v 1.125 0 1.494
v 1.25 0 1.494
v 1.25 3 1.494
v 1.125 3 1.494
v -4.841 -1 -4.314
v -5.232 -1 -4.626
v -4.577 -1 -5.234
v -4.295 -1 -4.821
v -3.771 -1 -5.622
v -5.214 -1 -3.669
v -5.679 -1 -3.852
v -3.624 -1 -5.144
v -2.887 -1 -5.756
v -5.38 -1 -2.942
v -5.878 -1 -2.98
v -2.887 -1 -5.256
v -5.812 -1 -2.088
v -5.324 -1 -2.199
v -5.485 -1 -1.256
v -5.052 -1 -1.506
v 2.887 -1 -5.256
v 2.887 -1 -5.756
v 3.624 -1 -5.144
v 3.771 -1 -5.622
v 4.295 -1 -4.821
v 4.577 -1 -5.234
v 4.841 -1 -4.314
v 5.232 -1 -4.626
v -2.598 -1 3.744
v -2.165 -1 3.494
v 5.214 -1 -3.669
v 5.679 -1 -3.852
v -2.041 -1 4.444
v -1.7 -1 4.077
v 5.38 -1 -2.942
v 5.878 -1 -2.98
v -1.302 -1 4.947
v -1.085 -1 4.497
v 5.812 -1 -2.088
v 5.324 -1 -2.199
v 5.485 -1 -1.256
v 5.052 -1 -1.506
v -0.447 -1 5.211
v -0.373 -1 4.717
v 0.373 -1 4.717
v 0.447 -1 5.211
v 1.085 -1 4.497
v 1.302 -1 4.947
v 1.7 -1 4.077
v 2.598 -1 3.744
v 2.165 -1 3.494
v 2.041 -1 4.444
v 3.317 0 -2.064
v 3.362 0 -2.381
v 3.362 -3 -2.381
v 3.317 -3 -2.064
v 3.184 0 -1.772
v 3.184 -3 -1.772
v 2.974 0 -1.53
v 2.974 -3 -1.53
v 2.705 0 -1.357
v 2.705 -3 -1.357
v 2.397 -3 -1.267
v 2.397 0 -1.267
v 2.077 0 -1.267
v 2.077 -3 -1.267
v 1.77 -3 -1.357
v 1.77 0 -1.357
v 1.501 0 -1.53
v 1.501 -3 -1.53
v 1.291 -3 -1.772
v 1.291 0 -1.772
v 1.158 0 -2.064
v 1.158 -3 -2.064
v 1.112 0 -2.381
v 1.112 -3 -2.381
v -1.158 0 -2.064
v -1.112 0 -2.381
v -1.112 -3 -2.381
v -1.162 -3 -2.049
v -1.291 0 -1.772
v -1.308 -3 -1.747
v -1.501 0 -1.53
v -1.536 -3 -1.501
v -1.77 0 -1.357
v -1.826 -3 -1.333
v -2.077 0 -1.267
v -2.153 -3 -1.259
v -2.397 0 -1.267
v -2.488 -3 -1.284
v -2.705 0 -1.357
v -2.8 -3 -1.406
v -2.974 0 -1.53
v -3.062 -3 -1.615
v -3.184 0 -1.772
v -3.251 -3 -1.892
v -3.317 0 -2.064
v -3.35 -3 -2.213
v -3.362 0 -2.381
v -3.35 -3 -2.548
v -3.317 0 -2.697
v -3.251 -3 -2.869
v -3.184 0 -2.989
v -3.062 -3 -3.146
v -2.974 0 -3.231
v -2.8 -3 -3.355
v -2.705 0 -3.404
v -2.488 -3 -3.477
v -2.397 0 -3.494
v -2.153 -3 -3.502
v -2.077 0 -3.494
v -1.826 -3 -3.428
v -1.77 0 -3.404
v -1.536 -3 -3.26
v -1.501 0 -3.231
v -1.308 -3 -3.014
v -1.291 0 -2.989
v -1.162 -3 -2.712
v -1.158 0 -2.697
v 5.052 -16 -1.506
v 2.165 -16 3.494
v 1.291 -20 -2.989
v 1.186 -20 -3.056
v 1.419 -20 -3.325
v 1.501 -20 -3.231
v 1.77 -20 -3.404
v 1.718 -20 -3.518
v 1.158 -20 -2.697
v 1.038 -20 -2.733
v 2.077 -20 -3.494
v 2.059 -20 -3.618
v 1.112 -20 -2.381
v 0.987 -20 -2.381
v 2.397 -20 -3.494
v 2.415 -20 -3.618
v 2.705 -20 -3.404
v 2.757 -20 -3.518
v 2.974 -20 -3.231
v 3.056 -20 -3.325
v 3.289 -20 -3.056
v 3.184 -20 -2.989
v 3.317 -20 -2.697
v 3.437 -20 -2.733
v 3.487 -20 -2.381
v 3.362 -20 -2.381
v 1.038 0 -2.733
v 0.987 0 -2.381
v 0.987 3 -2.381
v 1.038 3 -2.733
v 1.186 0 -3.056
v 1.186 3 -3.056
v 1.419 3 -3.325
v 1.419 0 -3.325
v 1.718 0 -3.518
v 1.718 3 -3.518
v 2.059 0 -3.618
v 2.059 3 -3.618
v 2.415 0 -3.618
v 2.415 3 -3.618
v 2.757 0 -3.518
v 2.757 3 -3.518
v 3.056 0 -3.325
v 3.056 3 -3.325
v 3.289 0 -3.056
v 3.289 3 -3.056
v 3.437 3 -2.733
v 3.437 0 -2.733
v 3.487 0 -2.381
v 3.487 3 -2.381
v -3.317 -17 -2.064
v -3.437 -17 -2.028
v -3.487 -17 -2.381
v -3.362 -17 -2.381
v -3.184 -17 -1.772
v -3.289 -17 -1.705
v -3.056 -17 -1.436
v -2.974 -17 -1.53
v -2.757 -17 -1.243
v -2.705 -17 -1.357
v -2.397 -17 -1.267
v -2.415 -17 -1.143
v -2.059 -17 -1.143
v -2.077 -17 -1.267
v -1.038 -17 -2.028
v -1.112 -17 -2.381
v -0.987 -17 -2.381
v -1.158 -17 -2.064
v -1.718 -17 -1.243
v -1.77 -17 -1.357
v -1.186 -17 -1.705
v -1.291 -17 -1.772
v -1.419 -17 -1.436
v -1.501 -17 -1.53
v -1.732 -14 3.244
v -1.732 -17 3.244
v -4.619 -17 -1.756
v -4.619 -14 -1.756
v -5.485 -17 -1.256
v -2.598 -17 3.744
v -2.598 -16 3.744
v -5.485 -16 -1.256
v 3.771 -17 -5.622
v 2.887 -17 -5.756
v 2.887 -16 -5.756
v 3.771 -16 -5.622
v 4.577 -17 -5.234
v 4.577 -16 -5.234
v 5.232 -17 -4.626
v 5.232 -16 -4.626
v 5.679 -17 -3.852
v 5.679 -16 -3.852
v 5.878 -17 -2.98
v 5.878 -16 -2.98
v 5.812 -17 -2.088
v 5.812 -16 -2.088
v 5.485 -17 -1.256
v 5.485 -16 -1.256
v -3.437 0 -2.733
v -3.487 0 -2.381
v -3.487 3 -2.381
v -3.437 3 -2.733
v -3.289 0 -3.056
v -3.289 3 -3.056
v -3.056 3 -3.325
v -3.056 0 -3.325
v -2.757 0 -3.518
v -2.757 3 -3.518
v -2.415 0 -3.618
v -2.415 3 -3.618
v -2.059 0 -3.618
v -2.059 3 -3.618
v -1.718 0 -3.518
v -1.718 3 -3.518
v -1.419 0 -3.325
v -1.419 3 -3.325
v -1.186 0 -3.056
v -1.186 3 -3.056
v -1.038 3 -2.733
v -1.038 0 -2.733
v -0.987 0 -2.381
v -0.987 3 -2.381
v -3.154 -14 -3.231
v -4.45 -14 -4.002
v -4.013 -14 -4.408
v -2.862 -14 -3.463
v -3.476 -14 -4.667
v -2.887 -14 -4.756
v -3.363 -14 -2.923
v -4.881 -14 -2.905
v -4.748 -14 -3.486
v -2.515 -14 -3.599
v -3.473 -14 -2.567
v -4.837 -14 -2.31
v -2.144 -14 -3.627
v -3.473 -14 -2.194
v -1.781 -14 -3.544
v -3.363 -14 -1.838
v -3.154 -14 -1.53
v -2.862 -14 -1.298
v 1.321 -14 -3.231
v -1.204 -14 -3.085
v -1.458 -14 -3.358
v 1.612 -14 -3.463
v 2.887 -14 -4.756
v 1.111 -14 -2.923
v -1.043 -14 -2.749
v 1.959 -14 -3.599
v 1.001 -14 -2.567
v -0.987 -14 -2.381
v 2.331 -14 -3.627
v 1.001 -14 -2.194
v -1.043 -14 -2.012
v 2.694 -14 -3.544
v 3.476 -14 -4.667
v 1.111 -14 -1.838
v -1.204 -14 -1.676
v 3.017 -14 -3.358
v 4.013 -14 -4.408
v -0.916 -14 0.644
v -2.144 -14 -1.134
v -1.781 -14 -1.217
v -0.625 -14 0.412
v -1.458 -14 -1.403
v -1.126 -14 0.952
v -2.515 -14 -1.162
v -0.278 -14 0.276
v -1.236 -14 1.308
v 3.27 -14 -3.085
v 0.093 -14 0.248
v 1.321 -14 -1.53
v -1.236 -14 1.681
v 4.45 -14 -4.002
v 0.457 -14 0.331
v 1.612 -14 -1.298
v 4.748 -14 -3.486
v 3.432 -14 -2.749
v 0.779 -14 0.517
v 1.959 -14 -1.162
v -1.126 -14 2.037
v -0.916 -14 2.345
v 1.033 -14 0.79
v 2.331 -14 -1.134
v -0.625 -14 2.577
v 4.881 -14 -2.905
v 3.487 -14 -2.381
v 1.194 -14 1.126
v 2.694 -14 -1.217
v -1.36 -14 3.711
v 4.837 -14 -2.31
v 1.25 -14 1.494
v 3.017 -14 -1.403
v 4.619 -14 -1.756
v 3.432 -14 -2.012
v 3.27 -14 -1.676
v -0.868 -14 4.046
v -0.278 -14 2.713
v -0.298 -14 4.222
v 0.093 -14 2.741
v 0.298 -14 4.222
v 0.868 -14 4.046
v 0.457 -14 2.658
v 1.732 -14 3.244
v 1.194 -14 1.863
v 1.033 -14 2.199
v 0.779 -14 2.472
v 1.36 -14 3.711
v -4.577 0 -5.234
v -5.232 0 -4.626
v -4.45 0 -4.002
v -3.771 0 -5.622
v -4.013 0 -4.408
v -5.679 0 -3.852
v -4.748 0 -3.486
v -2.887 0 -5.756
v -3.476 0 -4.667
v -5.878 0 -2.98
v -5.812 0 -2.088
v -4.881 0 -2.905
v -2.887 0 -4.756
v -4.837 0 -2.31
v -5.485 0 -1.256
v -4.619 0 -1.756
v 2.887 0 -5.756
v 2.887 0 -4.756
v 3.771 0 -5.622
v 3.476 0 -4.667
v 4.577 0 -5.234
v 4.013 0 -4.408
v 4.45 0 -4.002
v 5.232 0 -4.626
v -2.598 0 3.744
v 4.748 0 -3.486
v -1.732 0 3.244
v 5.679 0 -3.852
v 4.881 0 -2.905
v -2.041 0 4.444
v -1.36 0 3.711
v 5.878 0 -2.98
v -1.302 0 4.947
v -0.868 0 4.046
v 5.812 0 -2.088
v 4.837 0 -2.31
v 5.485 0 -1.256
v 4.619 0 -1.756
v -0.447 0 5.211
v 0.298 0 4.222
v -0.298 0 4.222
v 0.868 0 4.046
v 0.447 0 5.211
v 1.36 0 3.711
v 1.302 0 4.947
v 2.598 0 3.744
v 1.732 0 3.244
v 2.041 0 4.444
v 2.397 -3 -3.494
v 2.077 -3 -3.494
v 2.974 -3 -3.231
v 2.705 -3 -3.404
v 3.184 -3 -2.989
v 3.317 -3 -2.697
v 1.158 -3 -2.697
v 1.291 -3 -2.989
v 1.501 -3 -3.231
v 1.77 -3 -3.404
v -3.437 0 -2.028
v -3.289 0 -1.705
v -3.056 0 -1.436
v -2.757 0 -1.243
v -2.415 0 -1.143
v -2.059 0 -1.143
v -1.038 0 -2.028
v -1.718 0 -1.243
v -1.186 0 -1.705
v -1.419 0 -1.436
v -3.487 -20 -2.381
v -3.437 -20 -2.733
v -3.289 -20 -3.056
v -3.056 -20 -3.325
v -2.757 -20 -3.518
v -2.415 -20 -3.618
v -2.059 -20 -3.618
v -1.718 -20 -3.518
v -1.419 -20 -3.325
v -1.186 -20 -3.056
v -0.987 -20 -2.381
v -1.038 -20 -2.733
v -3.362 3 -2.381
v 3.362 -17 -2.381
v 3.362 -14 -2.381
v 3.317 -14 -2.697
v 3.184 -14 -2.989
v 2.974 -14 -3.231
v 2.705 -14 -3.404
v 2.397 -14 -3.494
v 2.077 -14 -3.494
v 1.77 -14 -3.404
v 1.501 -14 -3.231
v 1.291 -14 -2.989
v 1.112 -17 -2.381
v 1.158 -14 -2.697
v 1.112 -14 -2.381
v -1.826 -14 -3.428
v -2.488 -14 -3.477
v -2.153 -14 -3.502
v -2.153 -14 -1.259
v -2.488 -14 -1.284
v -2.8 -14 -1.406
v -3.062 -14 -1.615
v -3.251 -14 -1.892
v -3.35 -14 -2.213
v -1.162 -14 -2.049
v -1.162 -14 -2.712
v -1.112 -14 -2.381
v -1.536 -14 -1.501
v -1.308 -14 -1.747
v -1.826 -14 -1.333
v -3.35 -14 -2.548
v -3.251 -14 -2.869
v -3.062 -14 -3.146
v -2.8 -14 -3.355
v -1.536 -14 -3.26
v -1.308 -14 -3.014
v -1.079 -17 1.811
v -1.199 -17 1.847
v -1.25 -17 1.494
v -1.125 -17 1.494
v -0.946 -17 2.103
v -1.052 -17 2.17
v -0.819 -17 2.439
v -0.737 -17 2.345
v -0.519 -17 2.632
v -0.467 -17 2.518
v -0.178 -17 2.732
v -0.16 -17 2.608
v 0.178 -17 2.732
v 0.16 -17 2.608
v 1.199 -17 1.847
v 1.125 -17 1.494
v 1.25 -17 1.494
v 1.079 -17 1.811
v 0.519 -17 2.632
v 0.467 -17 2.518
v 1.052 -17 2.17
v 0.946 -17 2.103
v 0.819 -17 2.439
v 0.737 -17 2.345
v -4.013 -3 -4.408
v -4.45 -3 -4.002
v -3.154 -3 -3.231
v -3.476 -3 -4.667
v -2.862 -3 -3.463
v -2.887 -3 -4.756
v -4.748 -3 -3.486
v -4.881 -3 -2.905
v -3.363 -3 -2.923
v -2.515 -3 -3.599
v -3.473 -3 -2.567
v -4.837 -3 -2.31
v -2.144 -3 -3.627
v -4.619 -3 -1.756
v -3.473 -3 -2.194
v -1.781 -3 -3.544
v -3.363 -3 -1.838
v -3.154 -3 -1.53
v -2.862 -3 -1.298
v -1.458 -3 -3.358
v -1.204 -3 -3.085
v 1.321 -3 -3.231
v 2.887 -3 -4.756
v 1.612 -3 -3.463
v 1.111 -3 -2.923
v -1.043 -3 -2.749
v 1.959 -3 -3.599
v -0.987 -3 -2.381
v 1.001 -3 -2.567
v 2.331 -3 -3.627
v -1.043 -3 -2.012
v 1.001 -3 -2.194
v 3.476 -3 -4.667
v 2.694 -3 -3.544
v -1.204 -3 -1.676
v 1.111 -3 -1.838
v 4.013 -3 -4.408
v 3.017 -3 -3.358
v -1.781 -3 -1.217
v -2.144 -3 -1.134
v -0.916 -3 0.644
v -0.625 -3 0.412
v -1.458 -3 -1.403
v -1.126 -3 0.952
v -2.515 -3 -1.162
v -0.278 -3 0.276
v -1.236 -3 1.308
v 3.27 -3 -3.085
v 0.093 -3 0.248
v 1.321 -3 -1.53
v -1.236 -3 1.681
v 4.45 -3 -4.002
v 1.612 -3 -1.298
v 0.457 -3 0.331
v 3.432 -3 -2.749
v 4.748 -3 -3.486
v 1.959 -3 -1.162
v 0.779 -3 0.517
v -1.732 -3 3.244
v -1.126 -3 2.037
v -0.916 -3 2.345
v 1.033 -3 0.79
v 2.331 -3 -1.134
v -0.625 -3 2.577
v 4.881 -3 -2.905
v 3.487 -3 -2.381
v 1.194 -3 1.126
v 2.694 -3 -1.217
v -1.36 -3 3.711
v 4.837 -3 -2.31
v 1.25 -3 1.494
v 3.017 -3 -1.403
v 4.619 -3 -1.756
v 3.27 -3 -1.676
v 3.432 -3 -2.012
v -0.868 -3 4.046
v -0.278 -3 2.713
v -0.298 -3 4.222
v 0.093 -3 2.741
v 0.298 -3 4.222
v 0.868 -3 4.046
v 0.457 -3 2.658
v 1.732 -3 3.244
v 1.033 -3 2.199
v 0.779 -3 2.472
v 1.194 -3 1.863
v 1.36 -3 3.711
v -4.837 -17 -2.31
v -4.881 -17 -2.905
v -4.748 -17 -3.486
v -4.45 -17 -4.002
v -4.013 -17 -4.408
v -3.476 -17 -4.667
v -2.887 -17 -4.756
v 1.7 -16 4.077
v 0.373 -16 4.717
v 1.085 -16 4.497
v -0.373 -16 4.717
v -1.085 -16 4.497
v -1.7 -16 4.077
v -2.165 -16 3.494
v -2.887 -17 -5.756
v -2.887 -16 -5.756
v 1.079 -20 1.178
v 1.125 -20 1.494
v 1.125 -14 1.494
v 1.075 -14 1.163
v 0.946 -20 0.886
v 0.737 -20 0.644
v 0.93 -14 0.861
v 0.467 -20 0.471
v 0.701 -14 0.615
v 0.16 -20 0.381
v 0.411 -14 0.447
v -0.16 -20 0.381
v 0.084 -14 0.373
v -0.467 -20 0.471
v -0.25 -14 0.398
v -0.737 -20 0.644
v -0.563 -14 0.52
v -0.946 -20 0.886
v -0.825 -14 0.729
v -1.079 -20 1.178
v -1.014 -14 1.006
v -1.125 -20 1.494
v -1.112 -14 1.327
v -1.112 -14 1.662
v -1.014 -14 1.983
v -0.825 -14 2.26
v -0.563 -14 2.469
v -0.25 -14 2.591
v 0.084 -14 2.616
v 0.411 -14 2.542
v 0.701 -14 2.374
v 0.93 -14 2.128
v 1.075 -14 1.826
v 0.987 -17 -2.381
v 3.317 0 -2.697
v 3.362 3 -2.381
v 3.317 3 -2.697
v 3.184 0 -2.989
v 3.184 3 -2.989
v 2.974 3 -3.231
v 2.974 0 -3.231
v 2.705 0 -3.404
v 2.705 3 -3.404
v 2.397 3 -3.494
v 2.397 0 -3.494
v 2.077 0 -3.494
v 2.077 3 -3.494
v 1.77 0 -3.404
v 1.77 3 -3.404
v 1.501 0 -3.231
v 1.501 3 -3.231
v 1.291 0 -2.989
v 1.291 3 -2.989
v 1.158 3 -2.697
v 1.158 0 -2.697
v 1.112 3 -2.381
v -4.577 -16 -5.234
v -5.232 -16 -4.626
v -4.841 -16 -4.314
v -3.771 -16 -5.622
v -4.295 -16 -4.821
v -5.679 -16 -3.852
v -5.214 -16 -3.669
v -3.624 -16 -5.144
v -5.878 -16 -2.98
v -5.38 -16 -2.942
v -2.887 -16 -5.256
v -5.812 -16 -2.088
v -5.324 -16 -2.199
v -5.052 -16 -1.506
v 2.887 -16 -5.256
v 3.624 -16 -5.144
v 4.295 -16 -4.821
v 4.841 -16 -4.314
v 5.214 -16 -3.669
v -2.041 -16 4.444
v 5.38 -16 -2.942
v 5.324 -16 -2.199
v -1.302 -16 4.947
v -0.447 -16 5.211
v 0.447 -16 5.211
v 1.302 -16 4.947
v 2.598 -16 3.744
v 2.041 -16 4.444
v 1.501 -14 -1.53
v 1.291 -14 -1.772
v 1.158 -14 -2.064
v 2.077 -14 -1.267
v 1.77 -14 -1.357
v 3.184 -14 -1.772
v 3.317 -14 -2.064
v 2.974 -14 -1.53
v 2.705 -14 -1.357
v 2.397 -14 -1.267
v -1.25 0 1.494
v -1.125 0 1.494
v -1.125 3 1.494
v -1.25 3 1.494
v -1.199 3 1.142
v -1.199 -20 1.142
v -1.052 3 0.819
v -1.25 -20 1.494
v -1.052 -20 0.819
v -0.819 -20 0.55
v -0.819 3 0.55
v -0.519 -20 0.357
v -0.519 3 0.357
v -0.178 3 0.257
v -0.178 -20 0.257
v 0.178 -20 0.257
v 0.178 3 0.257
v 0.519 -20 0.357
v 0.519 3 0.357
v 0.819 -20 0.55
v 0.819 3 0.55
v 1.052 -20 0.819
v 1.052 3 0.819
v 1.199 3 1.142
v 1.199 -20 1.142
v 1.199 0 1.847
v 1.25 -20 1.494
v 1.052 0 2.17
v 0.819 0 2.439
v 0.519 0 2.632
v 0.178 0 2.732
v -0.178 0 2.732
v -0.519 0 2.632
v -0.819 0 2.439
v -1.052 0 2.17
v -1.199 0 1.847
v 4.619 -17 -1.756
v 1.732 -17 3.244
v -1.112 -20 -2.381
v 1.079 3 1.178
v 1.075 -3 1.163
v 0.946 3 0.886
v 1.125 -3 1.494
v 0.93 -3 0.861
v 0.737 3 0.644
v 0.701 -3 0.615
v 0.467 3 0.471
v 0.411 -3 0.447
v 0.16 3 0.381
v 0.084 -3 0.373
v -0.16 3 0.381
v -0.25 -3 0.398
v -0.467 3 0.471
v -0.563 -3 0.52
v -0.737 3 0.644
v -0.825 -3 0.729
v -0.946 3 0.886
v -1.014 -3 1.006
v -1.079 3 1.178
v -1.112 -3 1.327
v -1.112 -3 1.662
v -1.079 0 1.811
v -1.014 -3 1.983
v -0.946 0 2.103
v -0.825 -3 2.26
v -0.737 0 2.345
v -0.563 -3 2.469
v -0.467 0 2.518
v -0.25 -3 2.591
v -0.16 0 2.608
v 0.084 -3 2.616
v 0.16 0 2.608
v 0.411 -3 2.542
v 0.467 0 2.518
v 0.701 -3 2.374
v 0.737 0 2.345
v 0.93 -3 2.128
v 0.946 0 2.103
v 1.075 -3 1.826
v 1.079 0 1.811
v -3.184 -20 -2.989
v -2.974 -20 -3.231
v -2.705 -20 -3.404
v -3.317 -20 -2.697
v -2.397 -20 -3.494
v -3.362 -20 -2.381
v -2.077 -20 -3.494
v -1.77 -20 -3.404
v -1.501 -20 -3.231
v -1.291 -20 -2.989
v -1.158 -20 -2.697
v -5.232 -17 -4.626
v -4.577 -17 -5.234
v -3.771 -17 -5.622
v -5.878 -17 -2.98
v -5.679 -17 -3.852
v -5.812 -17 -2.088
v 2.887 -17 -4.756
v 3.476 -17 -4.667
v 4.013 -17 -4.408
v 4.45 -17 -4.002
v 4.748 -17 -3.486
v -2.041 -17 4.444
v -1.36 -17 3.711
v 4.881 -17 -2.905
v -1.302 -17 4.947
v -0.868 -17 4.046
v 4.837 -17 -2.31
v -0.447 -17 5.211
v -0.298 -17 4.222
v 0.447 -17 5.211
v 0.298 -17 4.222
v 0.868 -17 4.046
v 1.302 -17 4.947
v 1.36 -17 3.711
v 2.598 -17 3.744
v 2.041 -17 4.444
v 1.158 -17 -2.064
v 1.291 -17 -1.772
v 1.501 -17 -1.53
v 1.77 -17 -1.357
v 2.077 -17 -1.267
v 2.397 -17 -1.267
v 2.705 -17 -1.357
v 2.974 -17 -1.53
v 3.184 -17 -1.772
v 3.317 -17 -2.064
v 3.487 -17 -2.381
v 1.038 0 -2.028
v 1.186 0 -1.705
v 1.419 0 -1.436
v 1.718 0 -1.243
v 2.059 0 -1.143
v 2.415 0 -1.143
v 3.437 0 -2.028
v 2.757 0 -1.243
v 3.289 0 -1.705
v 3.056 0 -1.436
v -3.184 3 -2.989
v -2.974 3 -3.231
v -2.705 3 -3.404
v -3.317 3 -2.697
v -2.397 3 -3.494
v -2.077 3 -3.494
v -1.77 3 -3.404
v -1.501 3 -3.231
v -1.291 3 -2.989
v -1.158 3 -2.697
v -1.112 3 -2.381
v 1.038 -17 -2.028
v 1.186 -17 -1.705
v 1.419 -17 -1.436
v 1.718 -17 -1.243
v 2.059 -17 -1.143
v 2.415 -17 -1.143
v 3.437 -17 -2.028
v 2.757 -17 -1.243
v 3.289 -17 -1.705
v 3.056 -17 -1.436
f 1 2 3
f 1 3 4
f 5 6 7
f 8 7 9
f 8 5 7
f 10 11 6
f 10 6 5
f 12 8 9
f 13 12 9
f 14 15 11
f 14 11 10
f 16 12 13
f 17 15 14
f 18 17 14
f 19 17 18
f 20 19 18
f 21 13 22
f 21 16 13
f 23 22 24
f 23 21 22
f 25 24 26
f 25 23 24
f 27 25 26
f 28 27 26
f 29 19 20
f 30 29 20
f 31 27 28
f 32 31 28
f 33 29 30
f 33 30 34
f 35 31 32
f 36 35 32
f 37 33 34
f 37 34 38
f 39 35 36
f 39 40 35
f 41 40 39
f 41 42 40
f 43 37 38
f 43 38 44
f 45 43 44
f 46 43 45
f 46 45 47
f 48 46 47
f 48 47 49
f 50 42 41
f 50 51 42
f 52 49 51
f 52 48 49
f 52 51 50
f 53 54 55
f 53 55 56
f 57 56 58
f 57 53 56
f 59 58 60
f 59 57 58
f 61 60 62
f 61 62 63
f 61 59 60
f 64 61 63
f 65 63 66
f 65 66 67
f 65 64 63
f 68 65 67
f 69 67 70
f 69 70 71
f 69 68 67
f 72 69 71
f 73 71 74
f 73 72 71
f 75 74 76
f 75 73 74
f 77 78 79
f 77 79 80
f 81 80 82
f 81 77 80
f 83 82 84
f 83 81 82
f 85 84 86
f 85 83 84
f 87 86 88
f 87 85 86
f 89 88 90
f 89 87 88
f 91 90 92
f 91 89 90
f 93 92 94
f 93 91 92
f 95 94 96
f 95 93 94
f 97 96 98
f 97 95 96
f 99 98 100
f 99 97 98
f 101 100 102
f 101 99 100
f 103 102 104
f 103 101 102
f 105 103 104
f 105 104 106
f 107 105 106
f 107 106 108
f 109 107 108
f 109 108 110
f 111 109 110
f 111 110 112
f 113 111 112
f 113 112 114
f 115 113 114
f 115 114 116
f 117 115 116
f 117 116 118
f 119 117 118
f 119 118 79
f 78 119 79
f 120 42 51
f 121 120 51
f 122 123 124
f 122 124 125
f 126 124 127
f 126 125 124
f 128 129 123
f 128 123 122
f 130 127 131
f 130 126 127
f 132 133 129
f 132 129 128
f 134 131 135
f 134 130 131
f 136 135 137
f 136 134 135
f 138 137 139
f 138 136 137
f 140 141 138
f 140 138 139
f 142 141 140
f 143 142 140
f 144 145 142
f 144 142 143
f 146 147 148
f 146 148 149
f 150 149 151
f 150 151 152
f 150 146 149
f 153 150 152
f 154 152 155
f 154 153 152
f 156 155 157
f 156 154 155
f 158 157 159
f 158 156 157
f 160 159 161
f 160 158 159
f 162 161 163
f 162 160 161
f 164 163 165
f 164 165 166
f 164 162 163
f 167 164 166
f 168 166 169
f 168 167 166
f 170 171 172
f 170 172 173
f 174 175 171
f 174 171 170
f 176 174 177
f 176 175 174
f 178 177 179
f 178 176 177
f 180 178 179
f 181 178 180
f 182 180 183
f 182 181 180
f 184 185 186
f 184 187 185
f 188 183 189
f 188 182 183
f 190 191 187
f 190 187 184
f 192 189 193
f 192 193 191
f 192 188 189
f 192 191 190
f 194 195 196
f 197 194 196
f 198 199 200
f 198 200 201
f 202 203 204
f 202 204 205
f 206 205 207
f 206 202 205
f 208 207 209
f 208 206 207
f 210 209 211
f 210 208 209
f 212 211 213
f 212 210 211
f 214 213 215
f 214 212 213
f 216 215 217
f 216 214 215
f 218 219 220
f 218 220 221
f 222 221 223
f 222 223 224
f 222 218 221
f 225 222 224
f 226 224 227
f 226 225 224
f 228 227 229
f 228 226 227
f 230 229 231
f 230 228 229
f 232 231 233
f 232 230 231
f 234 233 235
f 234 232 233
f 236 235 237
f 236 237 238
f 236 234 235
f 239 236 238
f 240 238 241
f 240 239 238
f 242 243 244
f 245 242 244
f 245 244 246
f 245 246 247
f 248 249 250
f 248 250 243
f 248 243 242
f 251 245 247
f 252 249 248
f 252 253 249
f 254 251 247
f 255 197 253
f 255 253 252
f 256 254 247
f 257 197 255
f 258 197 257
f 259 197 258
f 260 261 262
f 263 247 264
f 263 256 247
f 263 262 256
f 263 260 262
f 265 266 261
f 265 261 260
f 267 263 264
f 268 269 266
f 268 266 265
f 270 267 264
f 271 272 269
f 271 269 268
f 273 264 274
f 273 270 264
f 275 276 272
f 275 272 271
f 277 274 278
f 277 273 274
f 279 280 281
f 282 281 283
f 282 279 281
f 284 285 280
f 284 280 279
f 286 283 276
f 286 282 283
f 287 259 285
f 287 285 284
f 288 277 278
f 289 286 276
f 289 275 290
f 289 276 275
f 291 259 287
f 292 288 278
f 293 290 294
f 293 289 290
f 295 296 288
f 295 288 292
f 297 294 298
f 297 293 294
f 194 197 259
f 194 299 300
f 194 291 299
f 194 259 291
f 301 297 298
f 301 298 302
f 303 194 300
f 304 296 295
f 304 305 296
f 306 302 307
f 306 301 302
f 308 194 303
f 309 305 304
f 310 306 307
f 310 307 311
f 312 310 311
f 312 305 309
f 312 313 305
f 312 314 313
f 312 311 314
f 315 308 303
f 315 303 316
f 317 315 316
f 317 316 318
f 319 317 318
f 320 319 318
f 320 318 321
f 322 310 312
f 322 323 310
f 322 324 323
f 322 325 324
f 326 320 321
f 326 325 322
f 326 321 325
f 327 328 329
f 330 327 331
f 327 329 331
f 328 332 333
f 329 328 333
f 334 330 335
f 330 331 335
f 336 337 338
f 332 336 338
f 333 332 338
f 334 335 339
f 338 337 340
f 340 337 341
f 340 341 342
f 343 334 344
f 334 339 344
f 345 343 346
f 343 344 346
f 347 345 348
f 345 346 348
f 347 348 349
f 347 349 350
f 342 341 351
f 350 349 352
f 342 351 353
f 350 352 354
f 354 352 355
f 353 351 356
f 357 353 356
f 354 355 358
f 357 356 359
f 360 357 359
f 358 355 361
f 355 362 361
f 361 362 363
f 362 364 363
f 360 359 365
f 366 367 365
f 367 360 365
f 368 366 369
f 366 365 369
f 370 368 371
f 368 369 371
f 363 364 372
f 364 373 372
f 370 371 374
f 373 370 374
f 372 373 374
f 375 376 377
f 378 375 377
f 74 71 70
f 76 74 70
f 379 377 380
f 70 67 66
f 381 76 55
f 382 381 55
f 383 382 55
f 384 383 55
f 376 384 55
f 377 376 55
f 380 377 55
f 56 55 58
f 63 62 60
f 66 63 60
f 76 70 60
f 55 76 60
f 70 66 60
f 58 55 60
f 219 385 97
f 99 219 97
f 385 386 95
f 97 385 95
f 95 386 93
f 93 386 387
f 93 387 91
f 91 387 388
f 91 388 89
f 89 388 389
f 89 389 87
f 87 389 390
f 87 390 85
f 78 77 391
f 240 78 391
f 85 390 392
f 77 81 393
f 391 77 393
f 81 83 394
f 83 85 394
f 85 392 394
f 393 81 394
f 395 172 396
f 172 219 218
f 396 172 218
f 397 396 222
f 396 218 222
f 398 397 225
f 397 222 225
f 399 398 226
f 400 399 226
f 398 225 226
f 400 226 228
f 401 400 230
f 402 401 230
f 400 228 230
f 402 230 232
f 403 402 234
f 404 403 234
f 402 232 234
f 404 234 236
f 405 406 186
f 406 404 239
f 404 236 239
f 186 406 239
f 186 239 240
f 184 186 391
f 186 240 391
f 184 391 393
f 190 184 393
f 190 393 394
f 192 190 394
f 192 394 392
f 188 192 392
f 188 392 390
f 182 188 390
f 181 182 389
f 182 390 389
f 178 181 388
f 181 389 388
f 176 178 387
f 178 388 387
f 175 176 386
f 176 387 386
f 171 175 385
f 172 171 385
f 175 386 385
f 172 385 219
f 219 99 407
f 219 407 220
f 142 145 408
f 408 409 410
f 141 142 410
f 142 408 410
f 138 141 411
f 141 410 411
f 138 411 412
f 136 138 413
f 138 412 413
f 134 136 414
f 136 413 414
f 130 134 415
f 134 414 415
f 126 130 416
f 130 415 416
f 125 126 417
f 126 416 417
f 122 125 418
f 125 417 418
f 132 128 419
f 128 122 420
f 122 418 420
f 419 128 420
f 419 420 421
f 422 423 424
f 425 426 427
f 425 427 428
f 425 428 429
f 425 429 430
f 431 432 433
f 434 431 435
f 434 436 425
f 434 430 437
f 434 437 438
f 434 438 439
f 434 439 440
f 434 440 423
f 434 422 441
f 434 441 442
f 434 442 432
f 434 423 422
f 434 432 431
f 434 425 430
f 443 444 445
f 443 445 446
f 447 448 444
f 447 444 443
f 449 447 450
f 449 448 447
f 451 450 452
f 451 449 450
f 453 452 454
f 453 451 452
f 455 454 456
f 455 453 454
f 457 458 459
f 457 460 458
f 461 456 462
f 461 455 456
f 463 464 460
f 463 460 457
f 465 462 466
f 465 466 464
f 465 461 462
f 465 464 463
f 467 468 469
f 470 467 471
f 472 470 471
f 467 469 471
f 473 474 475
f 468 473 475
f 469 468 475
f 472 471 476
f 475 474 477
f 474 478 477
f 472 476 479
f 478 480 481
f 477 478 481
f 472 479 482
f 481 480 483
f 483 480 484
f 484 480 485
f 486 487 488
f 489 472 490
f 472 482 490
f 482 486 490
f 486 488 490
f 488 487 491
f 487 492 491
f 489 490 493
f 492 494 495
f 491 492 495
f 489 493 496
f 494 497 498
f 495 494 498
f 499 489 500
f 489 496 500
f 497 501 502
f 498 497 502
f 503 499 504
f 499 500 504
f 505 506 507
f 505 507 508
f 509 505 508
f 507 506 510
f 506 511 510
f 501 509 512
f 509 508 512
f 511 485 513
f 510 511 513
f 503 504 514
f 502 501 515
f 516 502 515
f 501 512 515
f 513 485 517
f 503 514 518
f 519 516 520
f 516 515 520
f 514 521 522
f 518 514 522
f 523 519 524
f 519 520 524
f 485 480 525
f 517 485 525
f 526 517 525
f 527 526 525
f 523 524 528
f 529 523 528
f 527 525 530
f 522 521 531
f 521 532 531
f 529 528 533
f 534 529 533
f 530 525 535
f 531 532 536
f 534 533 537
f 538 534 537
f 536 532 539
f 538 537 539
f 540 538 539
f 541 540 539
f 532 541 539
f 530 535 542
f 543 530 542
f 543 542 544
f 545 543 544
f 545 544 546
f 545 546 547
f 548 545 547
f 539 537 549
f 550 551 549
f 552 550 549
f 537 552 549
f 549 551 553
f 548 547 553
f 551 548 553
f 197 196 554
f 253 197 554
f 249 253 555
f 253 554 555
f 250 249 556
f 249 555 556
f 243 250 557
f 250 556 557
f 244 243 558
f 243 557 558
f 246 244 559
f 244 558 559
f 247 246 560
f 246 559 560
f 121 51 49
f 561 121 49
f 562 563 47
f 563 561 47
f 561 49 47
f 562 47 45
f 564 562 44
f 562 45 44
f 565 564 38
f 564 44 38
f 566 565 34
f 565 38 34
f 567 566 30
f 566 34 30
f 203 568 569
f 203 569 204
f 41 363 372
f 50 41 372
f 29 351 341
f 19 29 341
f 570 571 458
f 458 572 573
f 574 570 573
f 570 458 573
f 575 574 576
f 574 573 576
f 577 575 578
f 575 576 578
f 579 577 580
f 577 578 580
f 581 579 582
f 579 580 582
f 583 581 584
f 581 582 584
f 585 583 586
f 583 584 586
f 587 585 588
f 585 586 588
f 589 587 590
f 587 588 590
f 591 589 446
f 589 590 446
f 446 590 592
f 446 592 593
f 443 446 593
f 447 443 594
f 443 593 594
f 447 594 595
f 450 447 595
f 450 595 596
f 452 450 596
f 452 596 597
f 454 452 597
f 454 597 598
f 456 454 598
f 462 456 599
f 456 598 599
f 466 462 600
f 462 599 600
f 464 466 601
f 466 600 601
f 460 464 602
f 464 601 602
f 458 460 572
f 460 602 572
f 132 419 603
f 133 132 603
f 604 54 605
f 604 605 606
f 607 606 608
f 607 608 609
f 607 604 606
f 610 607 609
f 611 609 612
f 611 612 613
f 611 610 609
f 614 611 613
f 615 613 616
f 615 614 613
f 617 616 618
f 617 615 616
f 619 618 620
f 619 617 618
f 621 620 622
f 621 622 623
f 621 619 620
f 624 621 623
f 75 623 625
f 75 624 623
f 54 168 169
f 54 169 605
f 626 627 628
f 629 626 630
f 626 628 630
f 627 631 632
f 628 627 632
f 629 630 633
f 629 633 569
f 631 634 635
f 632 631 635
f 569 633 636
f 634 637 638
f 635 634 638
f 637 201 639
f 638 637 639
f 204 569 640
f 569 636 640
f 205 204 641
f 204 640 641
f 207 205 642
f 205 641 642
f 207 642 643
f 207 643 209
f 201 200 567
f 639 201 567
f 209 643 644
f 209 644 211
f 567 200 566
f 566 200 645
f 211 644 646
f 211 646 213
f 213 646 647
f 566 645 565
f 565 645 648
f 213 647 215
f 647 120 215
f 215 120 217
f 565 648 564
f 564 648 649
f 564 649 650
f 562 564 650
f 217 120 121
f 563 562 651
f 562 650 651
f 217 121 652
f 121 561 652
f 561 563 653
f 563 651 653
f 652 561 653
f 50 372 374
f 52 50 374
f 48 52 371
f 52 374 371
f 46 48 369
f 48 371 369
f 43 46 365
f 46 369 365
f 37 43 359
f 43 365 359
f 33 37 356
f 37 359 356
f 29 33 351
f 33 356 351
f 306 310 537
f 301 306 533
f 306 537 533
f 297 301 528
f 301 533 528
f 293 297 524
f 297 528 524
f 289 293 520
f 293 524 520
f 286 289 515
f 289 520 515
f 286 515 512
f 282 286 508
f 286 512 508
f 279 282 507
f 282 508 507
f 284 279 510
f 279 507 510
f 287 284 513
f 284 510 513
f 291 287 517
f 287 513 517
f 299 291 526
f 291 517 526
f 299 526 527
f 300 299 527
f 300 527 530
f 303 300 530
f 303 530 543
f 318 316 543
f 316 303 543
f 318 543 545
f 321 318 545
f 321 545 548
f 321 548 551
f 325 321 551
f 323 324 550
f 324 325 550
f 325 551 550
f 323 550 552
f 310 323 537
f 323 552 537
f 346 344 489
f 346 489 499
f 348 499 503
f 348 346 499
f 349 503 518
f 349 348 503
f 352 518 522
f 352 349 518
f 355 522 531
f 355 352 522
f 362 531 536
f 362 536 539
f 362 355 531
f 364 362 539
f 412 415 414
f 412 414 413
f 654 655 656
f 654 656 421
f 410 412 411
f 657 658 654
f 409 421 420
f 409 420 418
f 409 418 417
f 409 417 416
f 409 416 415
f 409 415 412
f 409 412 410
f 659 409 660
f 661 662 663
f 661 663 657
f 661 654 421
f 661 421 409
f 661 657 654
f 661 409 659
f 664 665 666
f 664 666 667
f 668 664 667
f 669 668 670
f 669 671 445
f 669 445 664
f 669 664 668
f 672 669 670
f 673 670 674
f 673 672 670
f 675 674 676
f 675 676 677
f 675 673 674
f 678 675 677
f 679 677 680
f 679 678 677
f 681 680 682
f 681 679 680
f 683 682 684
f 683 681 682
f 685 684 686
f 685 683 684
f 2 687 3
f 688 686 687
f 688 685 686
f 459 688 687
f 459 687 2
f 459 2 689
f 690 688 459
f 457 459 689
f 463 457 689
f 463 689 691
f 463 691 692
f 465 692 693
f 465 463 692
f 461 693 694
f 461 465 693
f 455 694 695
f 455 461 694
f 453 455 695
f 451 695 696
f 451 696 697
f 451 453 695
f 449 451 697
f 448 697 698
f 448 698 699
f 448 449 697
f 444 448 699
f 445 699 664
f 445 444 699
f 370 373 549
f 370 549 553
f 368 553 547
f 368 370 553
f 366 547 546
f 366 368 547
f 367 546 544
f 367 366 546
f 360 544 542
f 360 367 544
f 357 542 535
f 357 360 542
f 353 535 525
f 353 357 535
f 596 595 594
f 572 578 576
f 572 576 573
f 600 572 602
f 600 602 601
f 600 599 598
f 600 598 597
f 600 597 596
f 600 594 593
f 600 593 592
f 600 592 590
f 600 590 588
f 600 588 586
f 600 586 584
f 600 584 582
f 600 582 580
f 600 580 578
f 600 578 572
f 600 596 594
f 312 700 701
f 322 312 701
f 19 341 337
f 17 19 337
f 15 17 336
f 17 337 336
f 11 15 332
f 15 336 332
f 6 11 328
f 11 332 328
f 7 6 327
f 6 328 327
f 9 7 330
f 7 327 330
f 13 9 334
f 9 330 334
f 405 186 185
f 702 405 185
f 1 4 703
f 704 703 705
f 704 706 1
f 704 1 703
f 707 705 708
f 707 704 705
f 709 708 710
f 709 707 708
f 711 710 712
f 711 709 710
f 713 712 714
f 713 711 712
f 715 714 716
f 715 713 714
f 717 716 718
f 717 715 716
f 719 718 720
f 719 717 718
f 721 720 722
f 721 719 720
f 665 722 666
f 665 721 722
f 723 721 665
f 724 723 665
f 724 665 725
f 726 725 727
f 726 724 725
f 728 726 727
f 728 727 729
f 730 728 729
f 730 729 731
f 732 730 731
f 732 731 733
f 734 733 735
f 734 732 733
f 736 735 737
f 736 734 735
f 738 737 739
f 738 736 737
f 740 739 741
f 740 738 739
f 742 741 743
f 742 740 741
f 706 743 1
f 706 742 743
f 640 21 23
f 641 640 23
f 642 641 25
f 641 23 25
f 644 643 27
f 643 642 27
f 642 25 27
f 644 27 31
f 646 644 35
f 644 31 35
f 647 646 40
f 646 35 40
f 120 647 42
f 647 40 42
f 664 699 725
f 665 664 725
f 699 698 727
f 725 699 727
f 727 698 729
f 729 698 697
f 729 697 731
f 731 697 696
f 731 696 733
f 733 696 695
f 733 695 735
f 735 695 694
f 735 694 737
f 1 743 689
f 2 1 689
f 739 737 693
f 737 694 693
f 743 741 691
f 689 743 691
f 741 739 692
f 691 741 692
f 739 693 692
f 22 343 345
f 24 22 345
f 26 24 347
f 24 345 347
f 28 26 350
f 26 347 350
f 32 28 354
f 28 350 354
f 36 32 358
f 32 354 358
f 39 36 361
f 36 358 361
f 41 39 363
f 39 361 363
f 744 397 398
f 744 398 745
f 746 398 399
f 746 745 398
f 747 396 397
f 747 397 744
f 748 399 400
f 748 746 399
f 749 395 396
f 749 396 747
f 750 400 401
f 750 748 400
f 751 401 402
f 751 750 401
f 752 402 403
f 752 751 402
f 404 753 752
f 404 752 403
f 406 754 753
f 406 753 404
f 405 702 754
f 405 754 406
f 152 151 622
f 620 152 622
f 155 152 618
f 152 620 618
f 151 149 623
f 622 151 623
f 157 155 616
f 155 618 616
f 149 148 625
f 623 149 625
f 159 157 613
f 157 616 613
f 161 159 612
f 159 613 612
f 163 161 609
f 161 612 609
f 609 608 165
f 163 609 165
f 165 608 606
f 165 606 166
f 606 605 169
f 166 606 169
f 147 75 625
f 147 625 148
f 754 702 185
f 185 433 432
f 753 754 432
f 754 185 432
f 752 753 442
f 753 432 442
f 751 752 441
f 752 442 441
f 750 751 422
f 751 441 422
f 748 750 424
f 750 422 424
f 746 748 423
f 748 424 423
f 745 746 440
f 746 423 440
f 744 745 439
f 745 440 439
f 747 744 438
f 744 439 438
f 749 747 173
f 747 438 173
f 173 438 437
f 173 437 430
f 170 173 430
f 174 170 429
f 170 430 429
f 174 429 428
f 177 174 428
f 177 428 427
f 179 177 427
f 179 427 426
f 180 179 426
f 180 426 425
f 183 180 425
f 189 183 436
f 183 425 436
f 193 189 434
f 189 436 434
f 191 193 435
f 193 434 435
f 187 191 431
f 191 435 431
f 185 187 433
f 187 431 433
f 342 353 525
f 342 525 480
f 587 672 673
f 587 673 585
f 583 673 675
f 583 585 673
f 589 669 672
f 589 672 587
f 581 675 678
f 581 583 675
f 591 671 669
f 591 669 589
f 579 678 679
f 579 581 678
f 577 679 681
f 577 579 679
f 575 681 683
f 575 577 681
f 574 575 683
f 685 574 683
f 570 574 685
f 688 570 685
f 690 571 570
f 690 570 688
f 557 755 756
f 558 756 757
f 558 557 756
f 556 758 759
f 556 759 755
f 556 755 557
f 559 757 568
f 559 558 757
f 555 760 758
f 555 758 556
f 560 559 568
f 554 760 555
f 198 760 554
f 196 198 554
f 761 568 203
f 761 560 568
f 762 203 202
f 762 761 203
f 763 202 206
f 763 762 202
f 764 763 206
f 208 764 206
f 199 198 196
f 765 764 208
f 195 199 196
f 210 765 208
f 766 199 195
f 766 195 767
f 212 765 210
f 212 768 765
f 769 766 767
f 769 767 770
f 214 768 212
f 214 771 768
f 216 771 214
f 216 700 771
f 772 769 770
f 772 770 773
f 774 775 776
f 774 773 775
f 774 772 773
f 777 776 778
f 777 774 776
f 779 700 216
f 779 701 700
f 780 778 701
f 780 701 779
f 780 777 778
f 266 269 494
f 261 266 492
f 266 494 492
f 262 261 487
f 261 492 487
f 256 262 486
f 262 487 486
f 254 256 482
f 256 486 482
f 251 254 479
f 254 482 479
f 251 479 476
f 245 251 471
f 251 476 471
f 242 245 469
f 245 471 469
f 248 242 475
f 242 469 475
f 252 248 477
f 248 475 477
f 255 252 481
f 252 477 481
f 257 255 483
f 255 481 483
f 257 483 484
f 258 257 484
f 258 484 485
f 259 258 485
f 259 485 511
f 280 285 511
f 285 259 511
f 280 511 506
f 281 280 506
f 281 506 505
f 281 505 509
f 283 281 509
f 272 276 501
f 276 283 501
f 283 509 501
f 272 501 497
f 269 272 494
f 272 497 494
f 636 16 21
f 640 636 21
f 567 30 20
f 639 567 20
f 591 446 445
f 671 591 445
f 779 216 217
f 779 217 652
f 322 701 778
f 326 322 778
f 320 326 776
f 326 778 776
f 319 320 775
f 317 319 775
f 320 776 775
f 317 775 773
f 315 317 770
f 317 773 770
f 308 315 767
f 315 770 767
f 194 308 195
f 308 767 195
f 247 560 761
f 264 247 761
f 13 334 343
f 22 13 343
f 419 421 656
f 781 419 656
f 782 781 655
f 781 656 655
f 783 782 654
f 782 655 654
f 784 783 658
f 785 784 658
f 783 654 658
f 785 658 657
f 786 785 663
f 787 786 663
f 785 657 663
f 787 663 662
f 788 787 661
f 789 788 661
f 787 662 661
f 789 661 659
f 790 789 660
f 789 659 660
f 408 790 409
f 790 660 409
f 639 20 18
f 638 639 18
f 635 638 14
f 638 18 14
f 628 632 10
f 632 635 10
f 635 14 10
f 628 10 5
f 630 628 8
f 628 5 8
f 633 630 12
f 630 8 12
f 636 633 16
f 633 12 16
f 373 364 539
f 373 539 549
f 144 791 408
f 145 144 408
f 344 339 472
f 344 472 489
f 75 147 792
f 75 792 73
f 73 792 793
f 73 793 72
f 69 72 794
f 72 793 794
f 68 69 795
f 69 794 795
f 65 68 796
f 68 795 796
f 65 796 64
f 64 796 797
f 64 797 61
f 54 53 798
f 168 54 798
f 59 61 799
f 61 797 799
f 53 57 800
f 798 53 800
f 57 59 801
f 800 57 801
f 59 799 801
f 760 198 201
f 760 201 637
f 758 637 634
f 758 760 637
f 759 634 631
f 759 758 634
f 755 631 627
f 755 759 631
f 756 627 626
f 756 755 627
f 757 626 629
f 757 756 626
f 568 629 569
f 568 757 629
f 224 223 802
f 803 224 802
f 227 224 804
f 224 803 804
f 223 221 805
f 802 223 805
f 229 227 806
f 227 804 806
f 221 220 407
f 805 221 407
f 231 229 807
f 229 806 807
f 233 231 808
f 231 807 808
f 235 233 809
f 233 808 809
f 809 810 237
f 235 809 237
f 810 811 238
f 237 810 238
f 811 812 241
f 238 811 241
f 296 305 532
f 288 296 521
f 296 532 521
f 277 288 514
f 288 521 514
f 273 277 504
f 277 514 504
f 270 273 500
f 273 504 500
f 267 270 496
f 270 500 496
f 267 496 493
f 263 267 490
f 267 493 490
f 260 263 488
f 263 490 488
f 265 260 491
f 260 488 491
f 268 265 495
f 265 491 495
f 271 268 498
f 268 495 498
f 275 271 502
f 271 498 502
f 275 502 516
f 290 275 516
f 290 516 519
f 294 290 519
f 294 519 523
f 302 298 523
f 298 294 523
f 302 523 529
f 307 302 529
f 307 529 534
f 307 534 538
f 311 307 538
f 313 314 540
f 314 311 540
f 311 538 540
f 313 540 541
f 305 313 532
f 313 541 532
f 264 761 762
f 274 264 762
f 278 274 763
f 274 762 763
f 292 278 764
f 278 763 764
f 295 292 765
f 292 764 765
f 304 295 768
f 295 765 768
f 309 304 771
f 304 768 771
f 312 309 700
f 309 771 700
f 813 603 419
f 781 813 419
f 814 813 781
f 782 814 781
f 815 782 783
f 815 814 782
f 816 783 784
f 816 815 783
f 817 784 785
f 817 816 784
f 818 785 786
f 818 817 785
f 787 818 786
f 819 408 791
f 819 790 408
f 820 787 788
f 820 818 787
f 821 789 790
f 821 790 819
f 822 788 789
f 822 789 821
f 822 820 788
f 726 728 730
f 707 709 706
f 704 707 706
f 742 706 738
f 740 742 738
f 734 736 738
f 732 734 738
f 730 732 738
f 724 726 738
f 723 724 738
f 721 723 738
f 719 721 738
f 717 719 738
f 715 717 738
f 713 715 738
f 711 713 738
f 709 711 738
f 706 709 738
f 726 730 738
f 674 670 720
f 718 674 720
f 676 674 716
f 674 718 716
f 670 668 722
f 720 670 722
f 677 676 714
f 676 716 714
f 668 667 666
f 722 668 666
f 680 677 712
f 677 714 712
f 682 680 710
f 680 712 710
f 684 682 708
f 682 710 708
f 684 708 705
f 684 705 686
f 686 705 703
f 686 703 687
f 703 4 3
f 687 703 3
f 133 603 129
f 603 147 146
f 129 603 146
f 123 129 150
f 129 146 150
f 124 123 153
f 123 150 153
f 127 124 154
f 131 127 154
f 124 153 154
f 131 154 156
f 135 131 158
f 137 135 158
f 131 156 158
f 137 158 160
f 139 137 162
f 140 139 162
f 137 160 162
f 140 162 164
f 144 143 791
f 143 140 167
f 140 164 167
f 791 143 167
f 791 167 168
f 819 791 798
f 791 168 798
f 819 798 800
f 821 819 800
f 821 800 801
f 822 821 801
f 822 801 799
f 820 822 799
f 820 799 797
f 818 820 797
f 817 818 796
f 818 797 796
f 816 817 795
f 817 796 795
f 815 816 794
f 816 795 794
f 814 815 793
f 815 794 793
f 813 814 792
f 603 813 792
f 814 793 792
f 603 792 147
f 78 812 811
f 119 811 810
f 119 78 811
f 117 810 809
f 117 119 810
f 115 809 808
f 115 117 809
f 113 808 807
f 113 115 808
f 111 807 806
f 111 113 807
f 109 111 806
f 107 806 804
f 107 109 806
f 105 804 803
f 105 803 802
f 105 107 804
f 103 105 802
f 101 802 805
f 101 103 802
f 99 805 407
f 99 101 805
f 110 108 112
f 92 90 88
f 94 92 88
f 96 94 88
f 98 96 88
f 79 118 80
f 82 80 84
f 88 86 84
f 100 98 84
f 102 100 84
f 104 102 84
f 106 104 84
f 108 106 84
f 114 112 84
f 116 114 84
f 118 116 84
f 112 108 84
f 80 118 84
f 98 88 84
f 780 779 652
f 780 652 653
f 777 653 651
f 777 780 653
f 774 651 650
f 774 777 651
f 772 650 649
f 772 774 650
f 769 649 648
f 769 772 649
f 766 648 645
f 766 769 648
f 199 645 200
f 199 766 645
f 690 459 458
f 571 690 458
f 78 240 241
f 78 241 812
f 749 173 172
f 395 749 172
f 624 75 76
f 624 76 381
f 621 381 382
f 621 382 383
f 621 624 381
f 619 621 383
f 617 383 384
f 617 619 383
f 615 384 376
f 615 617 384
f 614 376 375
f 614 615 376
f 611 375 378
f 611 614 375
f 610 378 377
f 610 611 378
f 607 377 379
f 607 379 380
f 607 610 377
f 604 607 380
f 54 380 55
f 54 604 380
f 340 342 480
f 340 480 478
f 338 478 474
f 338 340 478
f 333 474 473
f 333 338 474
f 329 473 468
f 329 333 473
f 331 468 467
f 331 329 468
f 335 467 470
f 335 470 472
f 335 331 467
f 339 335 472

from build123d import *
from build123d import SkipClean  # not in build123d's __all__

# Parameters (mm, degrees)
F1_DEPTH  = 17
F2_DEPTH  = 1
F3_DEPTH  = 3
F4_DEPTH  = 17
F5_DEPTH  = 20
F6_DEPTH  = 14
F7_DEPTH  = 3
F8_DEPTH  = 3
F10_DEPTH = 1
F9_R      = 1.25
F11_DEPTH = 3


with BuildPart() as f1:
    # F0 (on Front) → F1 (new body)
    with BuildSketch(Plane.XZ):
        with BuildLine():
            Line((-2.1650635095, 3.4944827652), (-5.0518148554, -1.5055172348))
            ThreePointArc((-5.0518148554, -1.5055172348), (-5.0518148554, -4.0055172348), (-2.8867513459, -5.2555172348))
            Line((-2.8867513459, -5.2555172348), (2.8867513459, -5.2555172348))
            ThreePointArc((2.8867513459, -5.2555172348), (5.0518148554, -4.0055172348), (5.0518148554, -1.5055172348))
            Line((5.0518148554, -1.5055172348), (2.1650635095, 3.4944827652))
            ThreePointArc((2.1650635095, 3.4944827652), (0, 4.7444827652), (-2.1650635095, 3.4944827652))
        make_face()
        with BuildLine():
            ThreePointArc((-2.8867513459, -4.7555172348), (-4.6188021535, -3.7555172348), (-4.6188021535, -1.7555172348))
            Line((-4.6188021535, -1.7555172348), (-1.7320508076, 3.2444827652))
            ThreePointArc((-1.7320508076, 3.2444827652), (0, 4.2444827652), (1.7320508076, 3.2444827652))
            Line((1.7320508076, 3.2444827652), (4.6188021535, -1.7555172348))
            ThreePointArc((4.6188021535, -1.7555172348), (4.6188021535, -3.7555172348), (2.8867513459, -4.7555172348))
            Line((2.8867513459, -4.7555172348), (-2.8867513459, -4.7555172348))
        make_face(mode=Mode.SUBTRACT)
        with BuildLine():
            Line((-1.7320508076, 3.2444827652), (-4.6188021535, -1.7555172348))
            ThreePointArc((-4.6188021535, -1.7555172348), (-4.6188021535, -3.7555172348), (-2.8867513459, -4.7555172348))
            Line((-2.8867513459, -4.7555172348), (2.8867513459, -4.7555172348))
            ThreePointArc((2.8867513459, -4.7555172348), (4.6188021535, -3.7555172348), (4.6188021535, -1.7555172348))
            Line((4.6188021535, -1.7555172348), (1.7320508076, 3.2444827652))
            ThreePointArc((1.7320508076, 3.2444827652), (0, 4.2444827652), (-1.7320508076, 3.2444827652))
        make_face()
        with BuildLine():
            ThreePointArc((-3.4872322931, -2.3805172348), (-2.2372322931, -1.1305172348), (-0.9872322931, -2.3805172348))
            ThreePointArc((-0.9872322931, -2.3805172348), (-2.2372322931, -3.6305172348), (-3.4872322931, -2.3805172348))
        make_face(mode=Mode.SUBTRACT)
        with BuildLine():
            ThreePointArc((0.9872322931, -2.3805172348), (2.2372322931, -1.1305172348), (3.4872322931, -2.3805172348))
            ThreePointArc((3.4872322931, -2.3805172348), (2.2372322931, -3.6305172348), (0.9872322931, -2.3805172348))
        make_face(mode=Mode.SUBTRACT)
        with BuildLine():
            ThreePointArc((-1.25, 1.4944827652), (0, 2.7444827652), (1.25, 1.4944827652))
            ThreePointArc((1.25, 1.4944827652), (0, 0.2444827652), (-1.25, 1.4944827652))
        make_face(mode=Mode.SUBTRACT)
    extrude(amount=F1_DEPTH)

    # F0 (on Front) → F2 (join)
    with BuildSketch(Plane.XZ):
        with BuildLine():
            Line((-2.5980762114, 3.7444827652), (-5.4848275573, -1.2555172348))
            ThreePointArc((-5.4848275573, -1.2555172348), (-5.4848275573, -4.2555172348), (-2.8867513459, -5.7555172348))
            Line((-2.8867513459, -5.7555172348), (2.8867513459, -5.7555172348))
            ThreePointArc((2.8867513459, -5.7555172348), (5.4848275573, -4.2555172348), (5.4848275573, -1.2555172348))
            Line((5.4848275573, -1.2555172348), (2.5980762114, 3.7444827652))
            ThreePointArc((2.5980762114, 3.7444827652), (0, 5.2444827652), (-2.5980762114, 3.7444827652))
        make_face()
        with BuildLine():
            ThreePointArc((-2.8867513459, -5.2555172348), (-5.0518148554, -4.0055172348), (-5.0518148554, -1.5055172348))
            Line((-5.0518148554, -1.5055172348), (-2.1650635095, 3.4944827652))
            ThreePointArc((-2.1650635095, 3.4944827652), (0, 4.7444827652), (2.1650635095, 3.4944827652))
            Line((2.1650635095, 3.4944827652), (5.0518148554, -1.5055172348))
            ThreePointArc((5.0518148554, -1.5055172348), (5.0518148554, -4.0055172348), (2.8867513459, -5.2555172348))
            Line((2.8867513459, -5.2555172348), (-2.8867513459, -5.2555172348))
        make_face(mode=Mode.SUBTRACT)
    extrude(amount=F2_DEPTH)

    # F0 (on Front) → F3 (cut)
    with BuildSketch(Plane.XZ):
        with BuildLine():
            Line((-1.7320508076, 3.2444827652), (-4.6188021535, -1.7555172348))
            ThreePointArc((-4.6188021535, -1.7555172348), (-4.6188021535, -3.7555172348), (-2.8867513459, -4.7555172348))
            Line((-2.8867513459, -4.7555172348), (2.8867513459, -4.7555172348))
            ThreePointArc((2.8867513459, -4.7555172348), (4.6188021535, -3.7555172348), (4.6188021535, -1.7555172348))
            Line((4.6188021535, -1.7555172348), (1.7320508076, 3.2444827652))
            ThreePointArc((1.7320508076, 3.2444827652), (0, 4.2444827652), (-1.7320508076, 3.2444827652))
        make_face()
        with BuildLine():
            ThreePointArc((-3.4872322931, -2.3805172348), (-2.2372322931, -1.1305172348), (-0.9872322931, -2.3805172348))
            ThreePointArc((-0.9872322931, -2.3805172348), (-2.2372322931, -3.6305172348), (-3.4872322931, -2.3805172348))
        make_face(mode=Mode.SUBTRACT)
        with BuildLine():
            ThreePointArc((0.9872322931, -2.3805172348), (2.2372322931, -1.1305172348), (3.4872322931, -2.3805172348))
            ThreePointArc((3.4872322931, -2.3805172348), (2.2372322931, -3.6305172348), (0.9872322931, -2.3805172348))
        make_face(mode=Mode.SUBTRACT)
        with BuildLine():
            ThreePointArc((-1.25, 1.4944827652), (0, 2.7444827652), (1.25, 1.4944827652))
            ThreePointArc((1.25, 1.4944827652), (0, 0.2444827652), (-1.25, 1.4944827652))
        make_face(mode=Mode.SUBTRACT)
        with BuildLine():
            ThreePointArc((1.112232334, -2.3805172348), (2.2372322931, -3.5055171939), (3.3622322522, -2.3805172348))
            ThreePointArc((3.3622322522, -2.3805172348), (2.2372322931, -1.2555172756), (1.112232334, -2.3805172348))
        make_face()
        with BuildLine():
            ThreePointArc((-1.125, 1.4944827652), (0, 0.3694827652), (1.125, 1.4944827652))
            ThreePointArc((1.125, 1.4944827652), (0, 2.6194827652), (-1.125, 1.4944827652))
        make_face()
        with BuildLine():
            ThreePointArc((-3.3622322931, -2.3805172348), (-2.2372322931, -3.5055172348), (-1.1122322931, -2.3805172348))
            ThreePointArc((-1.1122322931, -2.3805172348), (-2.2372322931, -1.2555172348), (-3.3622322931, -2.3805172348))
        make_face()
    extrude(amount=F3_DEPTH, mode=Mode.SUBTRACT)

    # F9 (on face) → F10 (join)
    with BuildSketch(Plane.XZ.offset(17)):
        with BuildLine():
            Line((-2.5980762912, 3.7444828113), (-5.4848276371, -1.2555171887))
            ThreePointArc((-5.4848276371, -1.2555171887), (-5.4848276371, -4.2555172809), (-2.8867513459, -5.7555173269))
            Line((-2.8867513459, -5.7555173269), (2.8867513459, -5.7555173269))
            ThreePointArc((2.8867513459, -5.7555173269), (5.4848276371, -4.2555172809), (5.4848276371, -1.2555171887))
            Line((5.4848276371, -1.2555171887), (2.5980762912, 3.7444828113))
            ThreePointArc((2.5980762912, 3.7444828113), (0, 5.2444828574), (-2.5980762912, 3.7444828113))
        make_face()
        with BuildLine():
            Line((-5.0518148554, -1.5055172348), (-2.1650635095, 3.4944827652))
            ThreePointArc((-2.1650635095, 3.4944827652), (0, 4.7444827652), (2.1650635095, 3.4944827652))
            Line((2.1650635095, 3.4944827652), (5.0518148554, -1.5055172348))
            ThreePointArc((5.0518148554, -1.5055172348), (5.0518148554, -4.0055172348), (2.8867513459, -5.2555172348))
            Line((2.8867513459, -5.2555172348), (-2.8867513459, -5.2555172348))
            ThreePointArc((-2.8867513459, -5.2555172348), (-5.0518148554, -4.0055172348), (-5.0518148554, -1.5055172348))
        make_face(mode=Mode.SUBTRACT)
    extrude(amount=-F10_DEPTH)

    # F9 (on face) → F11 (cut)
    with BuildSketch(Plane.XZ.offset(17)):
        with BuildLine():
            Line((-1.7320508399, 3.2444827839), (-4.6188021858, -1.7555172161))
            ThreePointArc((-4.6188021858, -1.7555172161), (-4.6188021858, -3.7555172534), (-2.8867513459, -4.7555172721))
            Line((-2.8867513459, -4.7555172721), (2.8867513459, -4.7555172721))
            ThreePointArc((2.8867513459, -4.7555172721), (4.6188021858, -3.7555172534), (4.6188021858, -1.7555172161))
            Line((4.6188021858, -1.7555172161), (1.7320508399, 3.2444827839))
            ThreePointArc((1.7320508399, 3.2444827839), (0, 4.2444828025), (-1.7320508399, 3.2444827839))
        make_face()
        with Locations((-2.2372322931, -2.3805172348)):
            Circle(F9_R, mode=Mode.SUBTRACT)
        with Locations((2.2372322931, -2.3805172348)):
            Circle(F9_R, mode=Mode.SUBTRACT)
        with Locations((0, 1.4944827652)):
            Circle(F9_R, mode=Mode.SUBTRACT)
    extrude(amount=-F11_DEPTH, mode=Mode.SUBTRACT)


with BuildPart() as f4:
    # F0 (on Front) → F4 (new body)
    with BuildSketch(Plane.XZ):
        with BuildLine():
            Line((3.3622322522, -2.3805172348), (3.4872322931, -2.3805172348))
            ThreePointArc((3.4872322931, -2.3805172348), (2.2372322931, -1.1305172348), (0.9872322931, -2.3805172348))
            Line((0.9872322931, -2.3805172348), (1.112232334, -2.3805172348))
            ThreePointArc((1.112232334, -2.3805172348), (2.2372322931, -1.2555172756), (3.3622322522, -2.3805172348))
        make_face()
    extrude(amount=F4_DEPTH)

    # F0 (on Front) → F5 (join)
    with BuildSketch(Plane.XZ):
        with BuildLine():
            ThreePointArc((0.9872322931, -2.3805172348), (2.2372322931, -3.6305172348), (3.4872322931, -2.3805172348))
            Line((3.4872322931, -2.3805172348), (3.3622322522, -2.3805172348))
            ThreePointArc((3.3622322522, -2.3805172348), (2.2372322931, -3.5055171939), (1.112232334, -2.3805172348))
            Line((1.112232334, -2.3805172348), (0.9872322931, -2.3805172348))
        make_face()
    extrude(amount=F5_DEPTH)

    # F0 (on Front) → F6, piece 2 (join)
    with BuildSketch(Plane.XZ):
        with BuildLine():
            ThreePointArc((1.112232334, -2.3805172348), (2.2372322931, -3.5055171939), (3.3622322522, -2.3805172348))
            ThreePointArc((3.3622322522, -2.3805172348), (2.2372322931, -1.2555172756), (1.112232334, -2.3805172348))
        make_face()
    extrude(amount=F6_DEPTH)


with BuildPart() as f4b:
    # F0 (on Front) → F4, piece 2 (new body)
    with BuildSketch(Plane.XZ):
        with BuildLine():
            Line((1.125, 1.4944827652), (1.25, 1.4944827652))
            ThreePointArc((1.25, 1.4944827652), (0, 2.7444827652), (-1.25, 1.4944827652))
            Line((-1.25, 1.4944827652), (-1.125, 1.4944827652))
            ThreePointArc((-1.125, 1.4944827652), (0, 2.6194827652), (1.125, 1.4944827652))
        make_face()
    extrude(amount=F4_DEPTH)

    # F0 (on Front) → F5, piece 3 (join)
    with BuildSketch(Plane.XZ):
        with BuildLine():
            ThreePointArc((-1.25, 1.4944827652), (0, 0.2444827652), (1.25, 1.4944827652))
            Line((1.25, 1.4944827652), (1.125, 1.4944827652))
            ThreePointArc((1.125, 1.4944827652), (0, 0.3694827652), (-1.125, 1.4944827652))
            Line((-1.125, 1.4944827652), (-1.25, 1.4944827652))
        make_face()
    extrude(amount=F5_DEPTH)

    # F0 (on Front) → F6 (join)
    with BuildSketch(Plane.XZ):
        with BuildLine():
            ThreePointArc((-1.125, 1.4944827652), (0, 0.3694827652), (1.125, 1.4944827652))
            ThreePointArc((1.125, 1.4944827652), (0, 2.6194827652), (-1.125, 1.4944827652))
        make_face()
    extrude(amount=F6_DEPTH)


with BuildPart() as f4c:
    # F0 (on Front) → F4, piece 3 (new body)
    with BuildSketch(Plane.XZ):
        with BuildLine():
            Line((-1.1122322931, -2.3805172348), (-0.9872322931, -2.3805172348))
            ThreePointArc((-0.9872322931, -2.3805172348), (-2.2372322931, -1.1305172348), (-3.4872322931, -2.3805172348))
            Line((-3.4872322931, -2.3805172348), (-3.3622322931, -2.3805172348))
            ThreePointArc((-3.3622322931, -2.3805172348), (-2.2372322931, -1.2555172348), (-1.1122322931, -2.3805172348))
        make_face()
    extrude(amount=F4_DEPTH)

    # F0 (on Front) → F5, piece 2 (join)
    with BuildSketch(Plane.XZ):
        with BuildLine():
            ThreePointArc((-3.4872322931, -2.3805172348), (-2.2372322931, -3.6305172348), (-0.9872322931, -2.3805172348))
            Line((-0.9872322931, -2.3805172348), (-1.1122322931, -2.3805172348))
            ThreePointArc((-1.1122322931, -2.3805172348), (-2.2372322931, -3.5055172348), (-3.3622322931, -2.3805172348))
            Line((-3.3622322931, -2.3805172348), (-3.4872322931, -2.3805172348))
        make_face()
    extrude(amount=F5_DEPTH)

    # F0 (on Front) → F6, piece 3 (join)
    with BuildSketch(Plane.XZ):
        with BuildLine():
            ThreePointArc((-3.3622322931, -2.3805172348), (-2.2372322931, -3.5055172348), (-1.1122322931, -2.3805172348))
            ThreePointArc((-1.1122322931, -2.3805172348), (-2.2372322931, -1.2555172348), (-3.3622322931, -2.3805172348))
        make_face()
    extrude(amount=F6_DEPTH)


with BuildPart() as f7_tool:
    # F0 (on Front) → F7 (new body, through all)
    with BuildSketch(Plane.XZ):
        with BuildLine():
            ThreePointArc((-1.125, 1.4944827652), (0, 0.3694827652), (1.125, 1.4944827652))
            ThreePointArc((1.125, 1.4944827652), (0, 2.6194827652), (-1.125, 1.4944827652))
        make_face()
        with BuildLine():
            ThreePointArc((-3.3622322931, -2.3805172348), (-2.2372322931, -3.5055172348), (-1.1122322931, -2.3805172348))
            ThreePointArc((-1.1122322931, -2.3805172348), (-2.2372322931, -1.2555172348), (-3.3622322931, -2.3805172348))
        make_face()
        with BuildLine():
            ThreePointArc((1.112232334, -2.3805172348), (2.2372322931, -3.5055171939), (3.3622322522, -2.3805172348))
            ThreePointArc((3.3622322522, -2.3805172348), (2.2372322931, -1.2555172756), (1.112232334, -2.3805172348))
        make_face()
    extrude(amount=F7_DEPTH)


with BuildPart() as f4_1:
    add(f4.part, clean=False)

    # F7: cut by f7_tool
    add(f7_tool.part, mode=Mode.SUBTRACT)

    # F0 (on Front) → F8 (join)
    with BuildSketch(Plane.XZ):
        with BuildLine():
            ThreePointArc((0.9872322931, -2.3805172348), (2.2372322931, -3.6305172348), (3.4872322931, -2.3805172348))
            Line((3.4872322931, -2.3805172348), (3.3622322522, -2.3805172348))
            ThreePointArc((3.3622322522, -2.3805172348), (2.2372322931, -3.5055171939), (1.112232334, -2.3805172348))
            Line((1.112232334, -2.3805172348), (0.9872322931, -2.3805172348))
        make_face()
    with SkipClean():  # cleaning this boolean's faces spoils the solid; the shape is the same uncleaned
        extrude(amount=-F8_DEPTH)


with BuildPart() as f4b_1:
    add(f4b.part, clean=False)

    # F7: cut by f7_tool
    add(f7_tool.part, mode=Mode.SUBTRACT)

    # F0 (on Front) → F8, piece 3 (join)
    with BuildSketch(Plane.XZ):
        with BuildLine():
            ThreePointArc((-1.25, 1.4944827652), (0, 0.2444827652), (1.25, 1.4944827652))
            Line((1.25, 1.4944827652), (1.125, 1.4944827652))
            ThreePointArc((1.125, 1.4944827652), (0, 0.3694827652), (-1.125, 1.4944827652))
            Line((-1.125, 1.4944827652), (-1.25, 1.4944827652))
        make_face()
    extrude(amount=-F8_DEPTH)


with BuildPart() as f4c_1:
    add(f4c.part, clean=False)

    # F7: cut by f7_tool
    add(f7_tool.part, mode=Mode.SUBTRACT)

    # F0 (on Front) → F8, piece 2 (join)
    with BuildSketch(Plane.XZ):
        with BuildLine():
            ThreePointArc((-3.4872322931, -2.3805172348), (-2.2372322931, -3.6305172348), (-0.9872322931, -2.3805172348))
            Line((-0.9872322931, -2.3805172348), (-1.1122322931, -2.3805172348))
            ThreePointArc((-1.1122322931, -2.3805172348), (-2.2372322931, -3.5055172348), (-3.3622322931, -2.3805172348))
            Line((-3.3622322931, -2.3805172348), (-3.4872322931, -2.3805172348))
        make_face()
    with SkipClean():  # cleaning this boolean's faces spoils the solid; the shape is the same uncleaned
        extrude(amount=-F8_DEPTH)


solid = Compound([f1.part, f4_1.part, f4b_1.part, f4c_1.part])
